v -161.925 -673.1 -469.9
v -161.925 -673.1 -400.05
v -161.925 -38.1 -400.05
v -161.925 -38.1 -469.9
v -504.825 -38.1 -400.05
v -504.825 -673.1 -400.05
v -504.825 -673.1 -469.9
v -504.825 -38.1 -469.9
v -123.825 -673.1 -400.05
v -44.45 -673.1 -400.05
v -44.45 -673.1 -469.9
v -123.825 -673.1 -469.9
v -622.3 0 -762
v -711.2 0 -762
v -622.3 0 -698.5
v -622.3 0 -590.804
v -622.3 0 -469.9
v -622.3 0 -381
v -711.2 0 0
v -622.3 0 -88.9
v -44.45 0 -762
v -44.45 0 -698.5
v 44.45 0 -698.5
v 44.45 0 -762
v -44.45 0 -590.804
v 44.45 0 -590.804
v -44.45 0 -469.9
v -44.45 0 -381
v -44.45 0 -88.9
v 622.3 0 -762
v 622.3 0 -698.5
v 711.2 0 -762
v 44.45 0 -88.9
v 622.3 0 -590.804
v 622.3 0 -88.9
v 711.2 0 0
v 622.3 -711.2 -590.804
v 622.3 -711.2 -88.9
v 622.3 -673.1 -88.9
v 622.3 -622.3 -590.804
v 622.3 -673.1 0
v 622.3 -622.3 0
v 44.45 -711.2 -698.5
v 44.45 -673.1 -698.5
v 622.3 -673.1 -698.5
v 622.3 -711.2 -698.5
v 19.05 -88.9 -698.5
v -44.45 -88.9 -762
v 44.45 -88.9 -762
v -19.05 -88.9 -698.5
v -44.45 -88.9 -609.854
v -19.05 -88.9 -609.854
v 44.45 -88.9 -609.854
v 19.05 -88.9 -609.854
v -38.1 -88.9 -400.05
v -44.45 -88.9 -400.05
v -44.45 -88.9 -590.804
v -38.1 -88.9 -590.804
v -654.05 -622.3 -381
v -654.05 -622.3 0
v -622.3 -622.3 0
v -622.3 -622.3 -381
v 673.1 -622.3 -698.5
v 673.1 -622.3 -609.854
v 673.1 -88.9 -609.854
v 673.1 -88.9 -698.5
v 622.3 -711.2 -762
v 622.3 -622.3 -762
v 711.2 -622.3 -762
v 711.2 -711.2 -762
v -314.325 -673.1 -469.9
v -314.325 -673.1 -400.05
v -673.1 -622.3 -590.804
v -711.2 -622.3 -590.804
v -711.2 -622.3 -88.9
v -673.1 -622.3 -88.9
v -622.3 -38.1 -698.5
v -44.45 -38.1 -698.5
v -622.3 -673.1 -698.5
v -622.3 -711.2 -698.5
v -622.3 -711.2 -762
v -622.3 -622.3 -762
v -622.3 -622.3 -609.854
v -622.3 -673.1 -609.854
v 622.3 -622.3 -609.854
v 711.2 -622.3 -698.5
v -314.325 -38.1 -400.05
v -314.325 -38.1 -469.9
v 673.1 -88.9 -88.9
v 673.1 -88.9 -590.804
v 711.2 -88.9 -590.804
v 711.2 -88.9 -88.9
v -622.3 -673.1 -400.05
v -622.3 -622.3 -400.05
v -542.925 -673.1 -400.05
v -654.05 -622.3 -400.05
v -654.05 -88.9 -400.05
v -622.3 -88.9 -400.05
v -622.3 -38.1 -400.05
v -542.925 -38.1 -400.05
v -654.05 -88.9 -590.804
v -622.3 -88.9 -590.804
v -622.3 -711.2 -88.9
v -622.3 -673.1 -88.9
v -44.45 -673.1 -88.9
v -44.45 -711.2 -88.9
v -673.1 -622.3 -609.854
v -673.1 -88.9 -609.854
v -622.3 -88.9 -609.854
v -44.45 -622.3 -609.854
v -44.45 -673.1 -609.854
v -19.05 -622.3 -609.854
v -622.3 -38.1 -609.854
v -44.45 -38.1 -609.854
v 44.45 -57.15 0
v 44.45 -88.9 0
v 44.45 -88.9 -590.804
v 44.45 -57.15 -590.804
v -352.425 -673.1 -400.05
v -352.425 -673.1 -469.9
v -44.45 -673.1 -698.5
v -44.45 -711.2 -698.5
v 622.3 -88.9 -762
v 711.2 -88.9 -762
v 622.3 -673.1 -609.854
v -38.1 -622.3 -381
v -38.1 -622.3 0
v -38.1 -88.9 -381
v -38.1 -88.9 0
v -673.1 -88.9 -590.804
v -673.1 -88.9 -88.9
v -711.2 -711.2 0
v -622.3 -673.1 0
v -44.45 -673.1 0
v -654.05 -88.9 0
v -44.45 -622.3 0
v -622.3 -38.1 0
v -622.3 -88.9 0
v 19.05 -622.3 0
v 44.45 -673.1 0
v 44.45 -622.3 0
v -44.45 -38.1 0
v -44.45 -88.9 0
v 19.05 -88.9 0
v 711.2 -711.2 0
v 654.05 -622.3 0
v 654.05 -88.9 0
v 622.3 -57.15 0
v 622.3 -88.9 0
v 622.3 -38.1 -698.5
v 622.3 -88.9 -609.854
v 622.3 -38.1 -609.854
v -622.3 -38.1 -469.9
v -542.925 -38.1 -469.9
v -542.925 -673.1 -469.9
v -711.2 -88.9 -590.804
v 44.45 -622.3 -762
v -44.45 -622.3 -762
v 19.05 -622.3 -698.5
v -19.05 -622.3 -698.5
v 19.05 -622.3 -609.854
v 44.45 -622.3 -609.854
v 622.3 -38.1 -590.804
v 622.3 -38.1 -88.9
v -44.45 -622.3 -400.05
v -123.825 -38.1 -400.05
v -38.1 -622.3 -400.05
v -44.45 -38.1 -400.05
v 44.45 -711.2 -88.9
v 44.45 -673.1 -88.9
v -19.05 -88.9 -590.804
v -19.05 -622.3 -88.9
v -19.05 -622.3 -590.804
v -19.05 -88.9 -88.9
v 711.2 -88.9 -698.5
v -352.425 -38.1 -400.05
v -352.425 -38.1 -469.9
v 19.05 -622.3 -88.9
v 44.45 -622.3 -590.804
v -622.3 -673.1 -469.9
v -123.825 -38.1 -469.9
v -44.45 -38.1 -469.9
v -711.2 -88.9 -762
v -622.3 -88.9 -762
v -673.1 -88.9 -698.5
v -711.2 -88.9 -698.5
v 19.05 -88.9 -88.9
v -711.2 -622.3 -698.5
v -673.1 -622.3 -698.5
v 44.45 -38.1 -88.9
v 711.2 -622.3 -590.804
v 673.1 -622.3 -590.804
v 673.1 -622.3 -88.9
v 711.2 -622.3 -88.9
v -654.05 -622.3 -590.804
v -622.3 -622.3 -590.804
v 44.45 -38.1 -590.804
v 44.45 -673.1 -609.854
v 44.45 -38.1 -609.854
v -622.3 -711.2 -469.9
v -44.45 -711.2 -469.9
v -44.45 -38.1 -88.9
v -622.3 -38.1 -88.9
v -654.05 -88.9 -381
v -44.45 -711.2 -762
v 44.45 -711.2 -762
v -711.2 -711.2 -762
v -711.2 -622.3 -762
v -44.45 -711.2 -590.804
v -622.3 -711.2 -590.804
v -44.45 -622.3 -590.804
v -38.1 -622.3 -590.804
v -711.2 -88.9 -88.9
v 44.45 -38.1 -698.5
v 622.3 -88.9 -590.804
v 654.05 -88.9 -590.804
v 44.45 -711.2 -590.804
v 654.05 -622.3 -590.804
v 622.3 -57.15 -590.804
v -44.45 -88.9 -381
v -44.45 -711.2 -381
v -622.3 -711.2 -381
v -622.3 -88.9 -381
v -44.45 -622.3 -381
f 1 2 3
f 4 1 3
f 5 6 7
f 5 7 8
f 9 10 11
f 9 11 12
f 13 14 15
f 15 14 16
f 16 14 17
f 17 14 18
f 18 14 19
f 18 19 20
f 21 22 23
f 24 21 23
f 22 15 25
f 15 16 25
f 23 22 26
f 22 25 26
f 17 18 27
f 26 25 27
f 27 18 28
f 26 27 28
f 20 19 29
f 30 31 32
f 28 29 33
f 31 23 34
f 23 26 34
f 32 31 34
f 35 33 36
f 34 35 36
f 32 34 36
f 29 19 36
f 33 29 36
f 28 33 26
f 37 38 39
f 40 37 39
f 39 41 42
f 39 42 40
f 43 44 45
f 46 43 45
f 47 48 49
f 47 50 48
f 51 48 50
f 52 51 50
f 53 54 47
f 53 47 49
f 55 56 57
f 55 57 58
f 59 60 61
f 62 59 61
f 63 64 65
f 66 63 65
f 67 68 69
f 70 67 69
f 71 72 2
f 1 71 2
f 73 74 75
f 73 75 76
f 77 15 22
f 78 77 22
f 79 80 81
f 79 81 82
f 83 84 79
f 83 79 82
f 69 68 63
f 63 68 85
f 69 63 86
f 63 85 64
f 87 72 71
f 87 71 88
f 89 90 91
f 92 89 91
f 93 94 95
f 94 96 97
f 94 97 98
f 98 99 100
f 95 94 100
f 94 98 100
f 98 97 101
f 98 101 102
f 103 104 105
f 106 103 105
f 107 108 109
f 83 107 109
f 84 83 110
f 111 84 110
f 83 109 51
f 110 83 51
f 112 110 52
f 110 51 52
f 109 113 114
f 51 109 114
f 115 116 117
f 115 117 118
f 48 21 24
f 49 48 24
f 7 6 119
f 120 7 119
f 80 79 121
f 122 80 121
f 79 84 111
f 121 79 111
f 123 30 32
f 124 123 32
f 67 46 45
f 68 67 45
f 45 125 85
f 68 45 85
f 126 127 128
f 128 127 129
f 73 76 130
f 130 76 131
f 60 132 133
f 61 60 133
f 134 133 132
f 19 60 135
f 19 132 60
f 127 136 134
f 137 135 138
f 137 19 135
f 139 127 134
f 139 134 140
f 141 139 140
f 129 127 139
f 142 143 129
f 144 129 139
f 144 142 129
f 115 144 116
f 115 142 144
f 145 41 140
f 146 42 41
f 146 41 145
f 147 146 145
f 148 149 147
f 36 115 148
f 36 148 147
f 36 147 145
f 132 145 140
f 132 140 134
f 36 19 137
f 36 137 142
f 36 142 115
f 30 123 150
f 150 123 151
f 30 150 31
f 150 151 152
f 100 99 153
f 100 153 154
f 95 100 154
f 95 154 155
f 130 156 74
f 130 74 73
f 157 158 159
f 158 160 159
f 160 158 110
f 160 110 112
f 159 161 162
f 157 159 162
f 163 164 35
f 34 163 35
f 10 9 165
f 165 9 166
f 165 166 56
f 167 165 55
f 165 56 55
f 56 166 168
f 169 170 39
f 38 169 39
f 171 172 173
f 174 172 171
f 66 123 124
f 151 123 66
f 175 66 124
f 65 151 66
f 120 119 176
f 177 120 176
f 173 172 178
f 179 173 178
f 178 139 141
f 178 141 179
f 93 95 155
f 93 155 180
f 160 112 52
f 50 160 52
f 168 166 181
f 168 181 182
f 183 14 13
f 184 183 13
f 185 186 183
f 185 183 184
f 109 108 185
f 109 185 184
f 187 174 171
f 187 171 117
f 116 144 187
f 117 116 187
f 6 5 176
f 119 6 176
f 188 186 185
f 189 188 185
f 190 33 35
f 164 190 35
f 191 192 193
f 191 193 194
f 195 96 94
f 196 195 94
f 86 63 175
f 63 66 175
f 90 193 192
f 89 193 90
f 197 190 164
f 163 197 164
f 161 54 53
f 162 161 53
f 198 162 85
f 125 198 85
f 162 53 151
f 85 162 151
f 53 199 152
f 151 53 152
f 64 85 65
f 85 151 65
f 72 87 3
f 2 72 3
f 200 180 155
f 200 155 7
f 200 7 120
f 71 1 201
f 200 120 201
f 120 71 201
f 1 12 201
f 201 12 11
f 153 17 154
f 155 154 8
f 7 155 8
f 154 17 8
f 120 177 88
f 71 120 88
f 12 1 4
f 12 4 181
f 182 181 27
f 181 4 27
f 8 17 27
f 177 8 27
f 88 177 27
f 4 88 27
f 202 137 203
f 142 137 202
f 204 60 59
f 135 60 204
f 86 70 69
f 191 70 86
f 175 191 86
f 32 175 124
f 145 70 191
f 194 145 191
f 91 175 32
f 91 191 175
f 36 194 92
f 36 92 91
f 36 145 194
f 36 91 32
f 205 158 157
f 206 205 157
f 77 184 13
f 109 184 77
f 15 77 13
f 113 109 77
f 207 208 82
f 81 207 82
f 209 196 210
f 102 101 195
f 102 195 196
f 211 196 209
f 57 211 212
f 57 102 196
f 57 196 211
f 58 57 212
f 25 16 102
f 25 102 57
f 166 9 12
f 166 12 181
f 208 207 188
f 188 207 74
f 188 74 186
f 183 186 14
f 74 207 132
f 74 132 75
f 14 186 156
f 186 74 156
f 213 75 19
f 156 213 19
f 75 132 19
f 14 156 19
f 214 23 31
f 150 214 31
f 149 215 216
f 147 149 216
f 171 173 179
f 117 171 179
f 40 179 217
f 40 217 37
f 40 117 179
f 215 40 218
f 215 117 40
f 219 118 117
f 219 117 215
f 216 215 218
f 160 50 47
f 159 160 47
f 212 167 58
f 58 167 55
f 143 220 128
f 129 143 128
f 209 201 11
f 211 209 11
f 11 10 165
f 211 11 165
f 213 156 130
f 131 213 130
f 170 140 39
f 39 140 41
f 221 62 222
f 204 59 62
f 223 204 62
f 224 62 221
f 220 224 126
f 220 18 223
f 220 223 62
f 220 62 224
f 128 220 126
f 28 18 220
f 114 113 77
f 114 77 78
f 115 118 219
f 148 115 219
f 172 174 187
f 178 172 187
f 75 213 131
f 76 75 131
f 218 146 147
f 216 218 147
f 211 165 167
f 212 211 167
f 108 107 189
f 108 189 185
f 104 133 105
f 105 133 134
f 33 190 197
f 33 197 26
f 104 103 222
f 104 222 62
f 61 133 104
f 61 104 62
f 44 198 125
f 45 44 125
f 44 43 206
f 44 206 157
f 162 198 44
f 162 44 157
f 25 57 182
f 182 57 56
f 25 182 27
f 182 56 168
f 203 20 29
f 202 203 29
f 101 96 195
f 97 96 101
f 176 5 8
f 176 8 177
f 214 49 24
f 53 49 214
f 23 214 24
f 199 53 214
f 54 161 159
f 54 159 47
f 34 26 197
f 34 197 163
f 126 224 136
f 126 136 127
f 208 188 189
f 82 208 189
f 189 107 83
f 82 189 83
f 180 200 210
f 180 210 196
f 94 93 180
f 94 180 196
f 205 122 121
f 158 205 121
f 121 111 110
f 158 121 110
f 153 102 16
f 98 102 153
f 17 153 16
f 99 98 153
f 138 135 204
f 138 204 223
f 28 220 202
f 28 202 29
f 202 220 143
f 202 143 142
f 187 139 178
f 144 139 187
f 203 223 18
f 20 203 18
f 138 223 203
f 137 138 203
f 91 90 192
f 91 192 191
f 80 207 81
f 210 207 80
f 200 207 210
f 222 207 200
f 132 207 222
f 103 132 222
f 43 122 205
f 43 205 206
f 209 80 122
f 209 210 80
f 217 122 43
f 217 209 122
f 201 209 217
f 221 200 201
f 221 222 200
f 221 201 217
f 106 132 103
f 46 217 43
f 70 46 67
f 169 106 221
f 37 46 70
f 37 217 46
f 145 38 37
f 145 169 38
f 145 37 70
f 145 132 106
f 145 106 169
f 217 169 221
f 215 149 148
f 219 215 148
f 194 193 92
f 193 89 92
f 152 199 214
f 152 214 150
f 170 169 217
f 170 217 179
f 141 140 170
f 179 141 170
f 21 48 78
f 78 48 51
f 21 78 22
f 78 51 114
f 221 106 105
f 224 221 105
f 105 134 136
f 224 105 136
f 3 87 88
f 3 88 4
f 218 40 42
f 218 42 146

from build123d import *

# Parameters (mm, degrees)
F0_W          = 1422.4
F0_H          = 711.2
F0_W_2        = 654.05
F0_H_2        = 635
F1_DEPTH      = 88.9
F2_W          = 88.9
F2_H          = 88.9
F3_DEPTH      = 762
F5_W          = 1422.4
F5_H          = 711.2
F5_W_2        = 654.05
F5_H_2        = 635
F6_DEPTH      = 88.9
F7_W          = 1422.4
F7_H          = 711.2
F8_DEPTH      = 18.796
F8_DEPTH_BACK = 0.254
F9_W          = 19.05
F9_H          = 533.4
F9_W_2        = 577.85
F9_H_2        = 19.05
F10_DEPTH     = 590.804
F12_W         = 152.4
F12_H         = 635
F13_DEPTH     = 88.9
F14_W         = 654.05
F14_H         = 635
F15_DEPTH     = 19.05


with BuildPart() as f1:
    # F0 (on Top) → F1 (new body)
    with BuildSketch(Plane.XY):
        with Locations((0, -355.6)):
            Rectangle(F0_W, F0_H)
        with Locations((-346.075, -355.6)):
            Rectangle(F0_W_2, F0_H_2, mode=Mode.SUBTRACT)
        with Locations((346.075, -355.6)):
            Rectangle(F0_W_2, F0_H_2, mode=Mode.SUBTRACT)
    extrude(amount=-F1_DEPTH)

    # F2 (on Top) → F3 (join)
    with BuildSketch(Plane.XY):
        with Locations((-666.75, -44.45)):
            Rectangle(F2_W, F2_H)
        with Locations((-666.75, -666.75)):
            Rectangle(F2_W, F2_H)
        with Locations((0, -44.45)):
            Rectangle(F2_W, F2_H)
        with Locations((0, -666.75)):
            Rectangle(F2_W, F2_H)
        with Locations((666.75, -44.45)):
            Rectangle(F2_W, F2_H)
        with Locations((666.75, -666.75)):
            Rectangle(F2_W, F2_H)
    extrude(amount=-F3_DEPTH)

    # F5 (on offset) → F6 (join)
    with BuildSketch(Plane.XY.offset(-609.6)):
        with Locations((0, -355.6)):
            Rectangle(F5_W, F5_H)
        with Locations((-346.075, -355.6)):
            Rectangle(F5_W_2, F5_H_2, mode=Mode.SUBTRACT)
        with Locations((346.075, -355.6)):
            Rectangle(F5_W_2, F5_H_2, mode=Mode.SUBTRACT)
    extrude(amount=-F6_DEPTH)

    # F7 (on offset) → F8 (join, two sides)
    with BuildSketch(Plane.XY.offset(-609.6)) as f8_sk:
        with Locations((0, -355.6)):
            Rectangle(F7_W, F7_H)
    extrude(amount=F8_DEPTH)
    extrude(f8_sk.sketch, amount=-F8_DEPTH_BACK)

    # F9 (on Top) → F10 (join, through all)
    with BuildSketch(Plane.XY):
        with Locations((663.575, -355.6)):
            Rectangle(F9_W, F9_H)
        with Locations((333.375, -47.625)):
            Rectangle(F9_W_2, F9_H_2)
        with Locations((-28.575, -355.6)):
            Rectangle(F9_W, F9_H)
        with Locations((-663.575, -355.6)):
            Rectangle(F9_W, F9_H)
    extrude(amount=-F10_DEPTH)

    # F12 (on offset) → F13 (join)
    with BuildSketch(Plane.XY.offset(-381)):
        Polygon((0, 0), (-711.2, 0), (-711.2, -38.1), (-542.925, -38.1), (-542.925, -673.1), (-711.2, -673.1), (-711.2, -711.2), (0, -711.2), (0, -673.1), (-123.825, -673.1), (-123.825, -38.1), (0, -38.1), align=None)
        with Locations((-428.625, -355.6)):
            Rectangle(F12_W, F12_H, mode=Mode.SUBTRACT)
        with Locations((-238.125, -355.6)):
            Rectangle(F12_W, F12_H, mode=Mode.SUBTRACT)
    extrude(amount=-F13_DEPTH)

    # F14 (on face) → F15 (join)
    with BuildSketch(Plane.XY.offset(-381)):
        with Locations((-346.075, -355.6)):
            Rectangle(F14_W, F14_H)
    extrude(amount=-F15_DEPTH)


solid = f1.part
